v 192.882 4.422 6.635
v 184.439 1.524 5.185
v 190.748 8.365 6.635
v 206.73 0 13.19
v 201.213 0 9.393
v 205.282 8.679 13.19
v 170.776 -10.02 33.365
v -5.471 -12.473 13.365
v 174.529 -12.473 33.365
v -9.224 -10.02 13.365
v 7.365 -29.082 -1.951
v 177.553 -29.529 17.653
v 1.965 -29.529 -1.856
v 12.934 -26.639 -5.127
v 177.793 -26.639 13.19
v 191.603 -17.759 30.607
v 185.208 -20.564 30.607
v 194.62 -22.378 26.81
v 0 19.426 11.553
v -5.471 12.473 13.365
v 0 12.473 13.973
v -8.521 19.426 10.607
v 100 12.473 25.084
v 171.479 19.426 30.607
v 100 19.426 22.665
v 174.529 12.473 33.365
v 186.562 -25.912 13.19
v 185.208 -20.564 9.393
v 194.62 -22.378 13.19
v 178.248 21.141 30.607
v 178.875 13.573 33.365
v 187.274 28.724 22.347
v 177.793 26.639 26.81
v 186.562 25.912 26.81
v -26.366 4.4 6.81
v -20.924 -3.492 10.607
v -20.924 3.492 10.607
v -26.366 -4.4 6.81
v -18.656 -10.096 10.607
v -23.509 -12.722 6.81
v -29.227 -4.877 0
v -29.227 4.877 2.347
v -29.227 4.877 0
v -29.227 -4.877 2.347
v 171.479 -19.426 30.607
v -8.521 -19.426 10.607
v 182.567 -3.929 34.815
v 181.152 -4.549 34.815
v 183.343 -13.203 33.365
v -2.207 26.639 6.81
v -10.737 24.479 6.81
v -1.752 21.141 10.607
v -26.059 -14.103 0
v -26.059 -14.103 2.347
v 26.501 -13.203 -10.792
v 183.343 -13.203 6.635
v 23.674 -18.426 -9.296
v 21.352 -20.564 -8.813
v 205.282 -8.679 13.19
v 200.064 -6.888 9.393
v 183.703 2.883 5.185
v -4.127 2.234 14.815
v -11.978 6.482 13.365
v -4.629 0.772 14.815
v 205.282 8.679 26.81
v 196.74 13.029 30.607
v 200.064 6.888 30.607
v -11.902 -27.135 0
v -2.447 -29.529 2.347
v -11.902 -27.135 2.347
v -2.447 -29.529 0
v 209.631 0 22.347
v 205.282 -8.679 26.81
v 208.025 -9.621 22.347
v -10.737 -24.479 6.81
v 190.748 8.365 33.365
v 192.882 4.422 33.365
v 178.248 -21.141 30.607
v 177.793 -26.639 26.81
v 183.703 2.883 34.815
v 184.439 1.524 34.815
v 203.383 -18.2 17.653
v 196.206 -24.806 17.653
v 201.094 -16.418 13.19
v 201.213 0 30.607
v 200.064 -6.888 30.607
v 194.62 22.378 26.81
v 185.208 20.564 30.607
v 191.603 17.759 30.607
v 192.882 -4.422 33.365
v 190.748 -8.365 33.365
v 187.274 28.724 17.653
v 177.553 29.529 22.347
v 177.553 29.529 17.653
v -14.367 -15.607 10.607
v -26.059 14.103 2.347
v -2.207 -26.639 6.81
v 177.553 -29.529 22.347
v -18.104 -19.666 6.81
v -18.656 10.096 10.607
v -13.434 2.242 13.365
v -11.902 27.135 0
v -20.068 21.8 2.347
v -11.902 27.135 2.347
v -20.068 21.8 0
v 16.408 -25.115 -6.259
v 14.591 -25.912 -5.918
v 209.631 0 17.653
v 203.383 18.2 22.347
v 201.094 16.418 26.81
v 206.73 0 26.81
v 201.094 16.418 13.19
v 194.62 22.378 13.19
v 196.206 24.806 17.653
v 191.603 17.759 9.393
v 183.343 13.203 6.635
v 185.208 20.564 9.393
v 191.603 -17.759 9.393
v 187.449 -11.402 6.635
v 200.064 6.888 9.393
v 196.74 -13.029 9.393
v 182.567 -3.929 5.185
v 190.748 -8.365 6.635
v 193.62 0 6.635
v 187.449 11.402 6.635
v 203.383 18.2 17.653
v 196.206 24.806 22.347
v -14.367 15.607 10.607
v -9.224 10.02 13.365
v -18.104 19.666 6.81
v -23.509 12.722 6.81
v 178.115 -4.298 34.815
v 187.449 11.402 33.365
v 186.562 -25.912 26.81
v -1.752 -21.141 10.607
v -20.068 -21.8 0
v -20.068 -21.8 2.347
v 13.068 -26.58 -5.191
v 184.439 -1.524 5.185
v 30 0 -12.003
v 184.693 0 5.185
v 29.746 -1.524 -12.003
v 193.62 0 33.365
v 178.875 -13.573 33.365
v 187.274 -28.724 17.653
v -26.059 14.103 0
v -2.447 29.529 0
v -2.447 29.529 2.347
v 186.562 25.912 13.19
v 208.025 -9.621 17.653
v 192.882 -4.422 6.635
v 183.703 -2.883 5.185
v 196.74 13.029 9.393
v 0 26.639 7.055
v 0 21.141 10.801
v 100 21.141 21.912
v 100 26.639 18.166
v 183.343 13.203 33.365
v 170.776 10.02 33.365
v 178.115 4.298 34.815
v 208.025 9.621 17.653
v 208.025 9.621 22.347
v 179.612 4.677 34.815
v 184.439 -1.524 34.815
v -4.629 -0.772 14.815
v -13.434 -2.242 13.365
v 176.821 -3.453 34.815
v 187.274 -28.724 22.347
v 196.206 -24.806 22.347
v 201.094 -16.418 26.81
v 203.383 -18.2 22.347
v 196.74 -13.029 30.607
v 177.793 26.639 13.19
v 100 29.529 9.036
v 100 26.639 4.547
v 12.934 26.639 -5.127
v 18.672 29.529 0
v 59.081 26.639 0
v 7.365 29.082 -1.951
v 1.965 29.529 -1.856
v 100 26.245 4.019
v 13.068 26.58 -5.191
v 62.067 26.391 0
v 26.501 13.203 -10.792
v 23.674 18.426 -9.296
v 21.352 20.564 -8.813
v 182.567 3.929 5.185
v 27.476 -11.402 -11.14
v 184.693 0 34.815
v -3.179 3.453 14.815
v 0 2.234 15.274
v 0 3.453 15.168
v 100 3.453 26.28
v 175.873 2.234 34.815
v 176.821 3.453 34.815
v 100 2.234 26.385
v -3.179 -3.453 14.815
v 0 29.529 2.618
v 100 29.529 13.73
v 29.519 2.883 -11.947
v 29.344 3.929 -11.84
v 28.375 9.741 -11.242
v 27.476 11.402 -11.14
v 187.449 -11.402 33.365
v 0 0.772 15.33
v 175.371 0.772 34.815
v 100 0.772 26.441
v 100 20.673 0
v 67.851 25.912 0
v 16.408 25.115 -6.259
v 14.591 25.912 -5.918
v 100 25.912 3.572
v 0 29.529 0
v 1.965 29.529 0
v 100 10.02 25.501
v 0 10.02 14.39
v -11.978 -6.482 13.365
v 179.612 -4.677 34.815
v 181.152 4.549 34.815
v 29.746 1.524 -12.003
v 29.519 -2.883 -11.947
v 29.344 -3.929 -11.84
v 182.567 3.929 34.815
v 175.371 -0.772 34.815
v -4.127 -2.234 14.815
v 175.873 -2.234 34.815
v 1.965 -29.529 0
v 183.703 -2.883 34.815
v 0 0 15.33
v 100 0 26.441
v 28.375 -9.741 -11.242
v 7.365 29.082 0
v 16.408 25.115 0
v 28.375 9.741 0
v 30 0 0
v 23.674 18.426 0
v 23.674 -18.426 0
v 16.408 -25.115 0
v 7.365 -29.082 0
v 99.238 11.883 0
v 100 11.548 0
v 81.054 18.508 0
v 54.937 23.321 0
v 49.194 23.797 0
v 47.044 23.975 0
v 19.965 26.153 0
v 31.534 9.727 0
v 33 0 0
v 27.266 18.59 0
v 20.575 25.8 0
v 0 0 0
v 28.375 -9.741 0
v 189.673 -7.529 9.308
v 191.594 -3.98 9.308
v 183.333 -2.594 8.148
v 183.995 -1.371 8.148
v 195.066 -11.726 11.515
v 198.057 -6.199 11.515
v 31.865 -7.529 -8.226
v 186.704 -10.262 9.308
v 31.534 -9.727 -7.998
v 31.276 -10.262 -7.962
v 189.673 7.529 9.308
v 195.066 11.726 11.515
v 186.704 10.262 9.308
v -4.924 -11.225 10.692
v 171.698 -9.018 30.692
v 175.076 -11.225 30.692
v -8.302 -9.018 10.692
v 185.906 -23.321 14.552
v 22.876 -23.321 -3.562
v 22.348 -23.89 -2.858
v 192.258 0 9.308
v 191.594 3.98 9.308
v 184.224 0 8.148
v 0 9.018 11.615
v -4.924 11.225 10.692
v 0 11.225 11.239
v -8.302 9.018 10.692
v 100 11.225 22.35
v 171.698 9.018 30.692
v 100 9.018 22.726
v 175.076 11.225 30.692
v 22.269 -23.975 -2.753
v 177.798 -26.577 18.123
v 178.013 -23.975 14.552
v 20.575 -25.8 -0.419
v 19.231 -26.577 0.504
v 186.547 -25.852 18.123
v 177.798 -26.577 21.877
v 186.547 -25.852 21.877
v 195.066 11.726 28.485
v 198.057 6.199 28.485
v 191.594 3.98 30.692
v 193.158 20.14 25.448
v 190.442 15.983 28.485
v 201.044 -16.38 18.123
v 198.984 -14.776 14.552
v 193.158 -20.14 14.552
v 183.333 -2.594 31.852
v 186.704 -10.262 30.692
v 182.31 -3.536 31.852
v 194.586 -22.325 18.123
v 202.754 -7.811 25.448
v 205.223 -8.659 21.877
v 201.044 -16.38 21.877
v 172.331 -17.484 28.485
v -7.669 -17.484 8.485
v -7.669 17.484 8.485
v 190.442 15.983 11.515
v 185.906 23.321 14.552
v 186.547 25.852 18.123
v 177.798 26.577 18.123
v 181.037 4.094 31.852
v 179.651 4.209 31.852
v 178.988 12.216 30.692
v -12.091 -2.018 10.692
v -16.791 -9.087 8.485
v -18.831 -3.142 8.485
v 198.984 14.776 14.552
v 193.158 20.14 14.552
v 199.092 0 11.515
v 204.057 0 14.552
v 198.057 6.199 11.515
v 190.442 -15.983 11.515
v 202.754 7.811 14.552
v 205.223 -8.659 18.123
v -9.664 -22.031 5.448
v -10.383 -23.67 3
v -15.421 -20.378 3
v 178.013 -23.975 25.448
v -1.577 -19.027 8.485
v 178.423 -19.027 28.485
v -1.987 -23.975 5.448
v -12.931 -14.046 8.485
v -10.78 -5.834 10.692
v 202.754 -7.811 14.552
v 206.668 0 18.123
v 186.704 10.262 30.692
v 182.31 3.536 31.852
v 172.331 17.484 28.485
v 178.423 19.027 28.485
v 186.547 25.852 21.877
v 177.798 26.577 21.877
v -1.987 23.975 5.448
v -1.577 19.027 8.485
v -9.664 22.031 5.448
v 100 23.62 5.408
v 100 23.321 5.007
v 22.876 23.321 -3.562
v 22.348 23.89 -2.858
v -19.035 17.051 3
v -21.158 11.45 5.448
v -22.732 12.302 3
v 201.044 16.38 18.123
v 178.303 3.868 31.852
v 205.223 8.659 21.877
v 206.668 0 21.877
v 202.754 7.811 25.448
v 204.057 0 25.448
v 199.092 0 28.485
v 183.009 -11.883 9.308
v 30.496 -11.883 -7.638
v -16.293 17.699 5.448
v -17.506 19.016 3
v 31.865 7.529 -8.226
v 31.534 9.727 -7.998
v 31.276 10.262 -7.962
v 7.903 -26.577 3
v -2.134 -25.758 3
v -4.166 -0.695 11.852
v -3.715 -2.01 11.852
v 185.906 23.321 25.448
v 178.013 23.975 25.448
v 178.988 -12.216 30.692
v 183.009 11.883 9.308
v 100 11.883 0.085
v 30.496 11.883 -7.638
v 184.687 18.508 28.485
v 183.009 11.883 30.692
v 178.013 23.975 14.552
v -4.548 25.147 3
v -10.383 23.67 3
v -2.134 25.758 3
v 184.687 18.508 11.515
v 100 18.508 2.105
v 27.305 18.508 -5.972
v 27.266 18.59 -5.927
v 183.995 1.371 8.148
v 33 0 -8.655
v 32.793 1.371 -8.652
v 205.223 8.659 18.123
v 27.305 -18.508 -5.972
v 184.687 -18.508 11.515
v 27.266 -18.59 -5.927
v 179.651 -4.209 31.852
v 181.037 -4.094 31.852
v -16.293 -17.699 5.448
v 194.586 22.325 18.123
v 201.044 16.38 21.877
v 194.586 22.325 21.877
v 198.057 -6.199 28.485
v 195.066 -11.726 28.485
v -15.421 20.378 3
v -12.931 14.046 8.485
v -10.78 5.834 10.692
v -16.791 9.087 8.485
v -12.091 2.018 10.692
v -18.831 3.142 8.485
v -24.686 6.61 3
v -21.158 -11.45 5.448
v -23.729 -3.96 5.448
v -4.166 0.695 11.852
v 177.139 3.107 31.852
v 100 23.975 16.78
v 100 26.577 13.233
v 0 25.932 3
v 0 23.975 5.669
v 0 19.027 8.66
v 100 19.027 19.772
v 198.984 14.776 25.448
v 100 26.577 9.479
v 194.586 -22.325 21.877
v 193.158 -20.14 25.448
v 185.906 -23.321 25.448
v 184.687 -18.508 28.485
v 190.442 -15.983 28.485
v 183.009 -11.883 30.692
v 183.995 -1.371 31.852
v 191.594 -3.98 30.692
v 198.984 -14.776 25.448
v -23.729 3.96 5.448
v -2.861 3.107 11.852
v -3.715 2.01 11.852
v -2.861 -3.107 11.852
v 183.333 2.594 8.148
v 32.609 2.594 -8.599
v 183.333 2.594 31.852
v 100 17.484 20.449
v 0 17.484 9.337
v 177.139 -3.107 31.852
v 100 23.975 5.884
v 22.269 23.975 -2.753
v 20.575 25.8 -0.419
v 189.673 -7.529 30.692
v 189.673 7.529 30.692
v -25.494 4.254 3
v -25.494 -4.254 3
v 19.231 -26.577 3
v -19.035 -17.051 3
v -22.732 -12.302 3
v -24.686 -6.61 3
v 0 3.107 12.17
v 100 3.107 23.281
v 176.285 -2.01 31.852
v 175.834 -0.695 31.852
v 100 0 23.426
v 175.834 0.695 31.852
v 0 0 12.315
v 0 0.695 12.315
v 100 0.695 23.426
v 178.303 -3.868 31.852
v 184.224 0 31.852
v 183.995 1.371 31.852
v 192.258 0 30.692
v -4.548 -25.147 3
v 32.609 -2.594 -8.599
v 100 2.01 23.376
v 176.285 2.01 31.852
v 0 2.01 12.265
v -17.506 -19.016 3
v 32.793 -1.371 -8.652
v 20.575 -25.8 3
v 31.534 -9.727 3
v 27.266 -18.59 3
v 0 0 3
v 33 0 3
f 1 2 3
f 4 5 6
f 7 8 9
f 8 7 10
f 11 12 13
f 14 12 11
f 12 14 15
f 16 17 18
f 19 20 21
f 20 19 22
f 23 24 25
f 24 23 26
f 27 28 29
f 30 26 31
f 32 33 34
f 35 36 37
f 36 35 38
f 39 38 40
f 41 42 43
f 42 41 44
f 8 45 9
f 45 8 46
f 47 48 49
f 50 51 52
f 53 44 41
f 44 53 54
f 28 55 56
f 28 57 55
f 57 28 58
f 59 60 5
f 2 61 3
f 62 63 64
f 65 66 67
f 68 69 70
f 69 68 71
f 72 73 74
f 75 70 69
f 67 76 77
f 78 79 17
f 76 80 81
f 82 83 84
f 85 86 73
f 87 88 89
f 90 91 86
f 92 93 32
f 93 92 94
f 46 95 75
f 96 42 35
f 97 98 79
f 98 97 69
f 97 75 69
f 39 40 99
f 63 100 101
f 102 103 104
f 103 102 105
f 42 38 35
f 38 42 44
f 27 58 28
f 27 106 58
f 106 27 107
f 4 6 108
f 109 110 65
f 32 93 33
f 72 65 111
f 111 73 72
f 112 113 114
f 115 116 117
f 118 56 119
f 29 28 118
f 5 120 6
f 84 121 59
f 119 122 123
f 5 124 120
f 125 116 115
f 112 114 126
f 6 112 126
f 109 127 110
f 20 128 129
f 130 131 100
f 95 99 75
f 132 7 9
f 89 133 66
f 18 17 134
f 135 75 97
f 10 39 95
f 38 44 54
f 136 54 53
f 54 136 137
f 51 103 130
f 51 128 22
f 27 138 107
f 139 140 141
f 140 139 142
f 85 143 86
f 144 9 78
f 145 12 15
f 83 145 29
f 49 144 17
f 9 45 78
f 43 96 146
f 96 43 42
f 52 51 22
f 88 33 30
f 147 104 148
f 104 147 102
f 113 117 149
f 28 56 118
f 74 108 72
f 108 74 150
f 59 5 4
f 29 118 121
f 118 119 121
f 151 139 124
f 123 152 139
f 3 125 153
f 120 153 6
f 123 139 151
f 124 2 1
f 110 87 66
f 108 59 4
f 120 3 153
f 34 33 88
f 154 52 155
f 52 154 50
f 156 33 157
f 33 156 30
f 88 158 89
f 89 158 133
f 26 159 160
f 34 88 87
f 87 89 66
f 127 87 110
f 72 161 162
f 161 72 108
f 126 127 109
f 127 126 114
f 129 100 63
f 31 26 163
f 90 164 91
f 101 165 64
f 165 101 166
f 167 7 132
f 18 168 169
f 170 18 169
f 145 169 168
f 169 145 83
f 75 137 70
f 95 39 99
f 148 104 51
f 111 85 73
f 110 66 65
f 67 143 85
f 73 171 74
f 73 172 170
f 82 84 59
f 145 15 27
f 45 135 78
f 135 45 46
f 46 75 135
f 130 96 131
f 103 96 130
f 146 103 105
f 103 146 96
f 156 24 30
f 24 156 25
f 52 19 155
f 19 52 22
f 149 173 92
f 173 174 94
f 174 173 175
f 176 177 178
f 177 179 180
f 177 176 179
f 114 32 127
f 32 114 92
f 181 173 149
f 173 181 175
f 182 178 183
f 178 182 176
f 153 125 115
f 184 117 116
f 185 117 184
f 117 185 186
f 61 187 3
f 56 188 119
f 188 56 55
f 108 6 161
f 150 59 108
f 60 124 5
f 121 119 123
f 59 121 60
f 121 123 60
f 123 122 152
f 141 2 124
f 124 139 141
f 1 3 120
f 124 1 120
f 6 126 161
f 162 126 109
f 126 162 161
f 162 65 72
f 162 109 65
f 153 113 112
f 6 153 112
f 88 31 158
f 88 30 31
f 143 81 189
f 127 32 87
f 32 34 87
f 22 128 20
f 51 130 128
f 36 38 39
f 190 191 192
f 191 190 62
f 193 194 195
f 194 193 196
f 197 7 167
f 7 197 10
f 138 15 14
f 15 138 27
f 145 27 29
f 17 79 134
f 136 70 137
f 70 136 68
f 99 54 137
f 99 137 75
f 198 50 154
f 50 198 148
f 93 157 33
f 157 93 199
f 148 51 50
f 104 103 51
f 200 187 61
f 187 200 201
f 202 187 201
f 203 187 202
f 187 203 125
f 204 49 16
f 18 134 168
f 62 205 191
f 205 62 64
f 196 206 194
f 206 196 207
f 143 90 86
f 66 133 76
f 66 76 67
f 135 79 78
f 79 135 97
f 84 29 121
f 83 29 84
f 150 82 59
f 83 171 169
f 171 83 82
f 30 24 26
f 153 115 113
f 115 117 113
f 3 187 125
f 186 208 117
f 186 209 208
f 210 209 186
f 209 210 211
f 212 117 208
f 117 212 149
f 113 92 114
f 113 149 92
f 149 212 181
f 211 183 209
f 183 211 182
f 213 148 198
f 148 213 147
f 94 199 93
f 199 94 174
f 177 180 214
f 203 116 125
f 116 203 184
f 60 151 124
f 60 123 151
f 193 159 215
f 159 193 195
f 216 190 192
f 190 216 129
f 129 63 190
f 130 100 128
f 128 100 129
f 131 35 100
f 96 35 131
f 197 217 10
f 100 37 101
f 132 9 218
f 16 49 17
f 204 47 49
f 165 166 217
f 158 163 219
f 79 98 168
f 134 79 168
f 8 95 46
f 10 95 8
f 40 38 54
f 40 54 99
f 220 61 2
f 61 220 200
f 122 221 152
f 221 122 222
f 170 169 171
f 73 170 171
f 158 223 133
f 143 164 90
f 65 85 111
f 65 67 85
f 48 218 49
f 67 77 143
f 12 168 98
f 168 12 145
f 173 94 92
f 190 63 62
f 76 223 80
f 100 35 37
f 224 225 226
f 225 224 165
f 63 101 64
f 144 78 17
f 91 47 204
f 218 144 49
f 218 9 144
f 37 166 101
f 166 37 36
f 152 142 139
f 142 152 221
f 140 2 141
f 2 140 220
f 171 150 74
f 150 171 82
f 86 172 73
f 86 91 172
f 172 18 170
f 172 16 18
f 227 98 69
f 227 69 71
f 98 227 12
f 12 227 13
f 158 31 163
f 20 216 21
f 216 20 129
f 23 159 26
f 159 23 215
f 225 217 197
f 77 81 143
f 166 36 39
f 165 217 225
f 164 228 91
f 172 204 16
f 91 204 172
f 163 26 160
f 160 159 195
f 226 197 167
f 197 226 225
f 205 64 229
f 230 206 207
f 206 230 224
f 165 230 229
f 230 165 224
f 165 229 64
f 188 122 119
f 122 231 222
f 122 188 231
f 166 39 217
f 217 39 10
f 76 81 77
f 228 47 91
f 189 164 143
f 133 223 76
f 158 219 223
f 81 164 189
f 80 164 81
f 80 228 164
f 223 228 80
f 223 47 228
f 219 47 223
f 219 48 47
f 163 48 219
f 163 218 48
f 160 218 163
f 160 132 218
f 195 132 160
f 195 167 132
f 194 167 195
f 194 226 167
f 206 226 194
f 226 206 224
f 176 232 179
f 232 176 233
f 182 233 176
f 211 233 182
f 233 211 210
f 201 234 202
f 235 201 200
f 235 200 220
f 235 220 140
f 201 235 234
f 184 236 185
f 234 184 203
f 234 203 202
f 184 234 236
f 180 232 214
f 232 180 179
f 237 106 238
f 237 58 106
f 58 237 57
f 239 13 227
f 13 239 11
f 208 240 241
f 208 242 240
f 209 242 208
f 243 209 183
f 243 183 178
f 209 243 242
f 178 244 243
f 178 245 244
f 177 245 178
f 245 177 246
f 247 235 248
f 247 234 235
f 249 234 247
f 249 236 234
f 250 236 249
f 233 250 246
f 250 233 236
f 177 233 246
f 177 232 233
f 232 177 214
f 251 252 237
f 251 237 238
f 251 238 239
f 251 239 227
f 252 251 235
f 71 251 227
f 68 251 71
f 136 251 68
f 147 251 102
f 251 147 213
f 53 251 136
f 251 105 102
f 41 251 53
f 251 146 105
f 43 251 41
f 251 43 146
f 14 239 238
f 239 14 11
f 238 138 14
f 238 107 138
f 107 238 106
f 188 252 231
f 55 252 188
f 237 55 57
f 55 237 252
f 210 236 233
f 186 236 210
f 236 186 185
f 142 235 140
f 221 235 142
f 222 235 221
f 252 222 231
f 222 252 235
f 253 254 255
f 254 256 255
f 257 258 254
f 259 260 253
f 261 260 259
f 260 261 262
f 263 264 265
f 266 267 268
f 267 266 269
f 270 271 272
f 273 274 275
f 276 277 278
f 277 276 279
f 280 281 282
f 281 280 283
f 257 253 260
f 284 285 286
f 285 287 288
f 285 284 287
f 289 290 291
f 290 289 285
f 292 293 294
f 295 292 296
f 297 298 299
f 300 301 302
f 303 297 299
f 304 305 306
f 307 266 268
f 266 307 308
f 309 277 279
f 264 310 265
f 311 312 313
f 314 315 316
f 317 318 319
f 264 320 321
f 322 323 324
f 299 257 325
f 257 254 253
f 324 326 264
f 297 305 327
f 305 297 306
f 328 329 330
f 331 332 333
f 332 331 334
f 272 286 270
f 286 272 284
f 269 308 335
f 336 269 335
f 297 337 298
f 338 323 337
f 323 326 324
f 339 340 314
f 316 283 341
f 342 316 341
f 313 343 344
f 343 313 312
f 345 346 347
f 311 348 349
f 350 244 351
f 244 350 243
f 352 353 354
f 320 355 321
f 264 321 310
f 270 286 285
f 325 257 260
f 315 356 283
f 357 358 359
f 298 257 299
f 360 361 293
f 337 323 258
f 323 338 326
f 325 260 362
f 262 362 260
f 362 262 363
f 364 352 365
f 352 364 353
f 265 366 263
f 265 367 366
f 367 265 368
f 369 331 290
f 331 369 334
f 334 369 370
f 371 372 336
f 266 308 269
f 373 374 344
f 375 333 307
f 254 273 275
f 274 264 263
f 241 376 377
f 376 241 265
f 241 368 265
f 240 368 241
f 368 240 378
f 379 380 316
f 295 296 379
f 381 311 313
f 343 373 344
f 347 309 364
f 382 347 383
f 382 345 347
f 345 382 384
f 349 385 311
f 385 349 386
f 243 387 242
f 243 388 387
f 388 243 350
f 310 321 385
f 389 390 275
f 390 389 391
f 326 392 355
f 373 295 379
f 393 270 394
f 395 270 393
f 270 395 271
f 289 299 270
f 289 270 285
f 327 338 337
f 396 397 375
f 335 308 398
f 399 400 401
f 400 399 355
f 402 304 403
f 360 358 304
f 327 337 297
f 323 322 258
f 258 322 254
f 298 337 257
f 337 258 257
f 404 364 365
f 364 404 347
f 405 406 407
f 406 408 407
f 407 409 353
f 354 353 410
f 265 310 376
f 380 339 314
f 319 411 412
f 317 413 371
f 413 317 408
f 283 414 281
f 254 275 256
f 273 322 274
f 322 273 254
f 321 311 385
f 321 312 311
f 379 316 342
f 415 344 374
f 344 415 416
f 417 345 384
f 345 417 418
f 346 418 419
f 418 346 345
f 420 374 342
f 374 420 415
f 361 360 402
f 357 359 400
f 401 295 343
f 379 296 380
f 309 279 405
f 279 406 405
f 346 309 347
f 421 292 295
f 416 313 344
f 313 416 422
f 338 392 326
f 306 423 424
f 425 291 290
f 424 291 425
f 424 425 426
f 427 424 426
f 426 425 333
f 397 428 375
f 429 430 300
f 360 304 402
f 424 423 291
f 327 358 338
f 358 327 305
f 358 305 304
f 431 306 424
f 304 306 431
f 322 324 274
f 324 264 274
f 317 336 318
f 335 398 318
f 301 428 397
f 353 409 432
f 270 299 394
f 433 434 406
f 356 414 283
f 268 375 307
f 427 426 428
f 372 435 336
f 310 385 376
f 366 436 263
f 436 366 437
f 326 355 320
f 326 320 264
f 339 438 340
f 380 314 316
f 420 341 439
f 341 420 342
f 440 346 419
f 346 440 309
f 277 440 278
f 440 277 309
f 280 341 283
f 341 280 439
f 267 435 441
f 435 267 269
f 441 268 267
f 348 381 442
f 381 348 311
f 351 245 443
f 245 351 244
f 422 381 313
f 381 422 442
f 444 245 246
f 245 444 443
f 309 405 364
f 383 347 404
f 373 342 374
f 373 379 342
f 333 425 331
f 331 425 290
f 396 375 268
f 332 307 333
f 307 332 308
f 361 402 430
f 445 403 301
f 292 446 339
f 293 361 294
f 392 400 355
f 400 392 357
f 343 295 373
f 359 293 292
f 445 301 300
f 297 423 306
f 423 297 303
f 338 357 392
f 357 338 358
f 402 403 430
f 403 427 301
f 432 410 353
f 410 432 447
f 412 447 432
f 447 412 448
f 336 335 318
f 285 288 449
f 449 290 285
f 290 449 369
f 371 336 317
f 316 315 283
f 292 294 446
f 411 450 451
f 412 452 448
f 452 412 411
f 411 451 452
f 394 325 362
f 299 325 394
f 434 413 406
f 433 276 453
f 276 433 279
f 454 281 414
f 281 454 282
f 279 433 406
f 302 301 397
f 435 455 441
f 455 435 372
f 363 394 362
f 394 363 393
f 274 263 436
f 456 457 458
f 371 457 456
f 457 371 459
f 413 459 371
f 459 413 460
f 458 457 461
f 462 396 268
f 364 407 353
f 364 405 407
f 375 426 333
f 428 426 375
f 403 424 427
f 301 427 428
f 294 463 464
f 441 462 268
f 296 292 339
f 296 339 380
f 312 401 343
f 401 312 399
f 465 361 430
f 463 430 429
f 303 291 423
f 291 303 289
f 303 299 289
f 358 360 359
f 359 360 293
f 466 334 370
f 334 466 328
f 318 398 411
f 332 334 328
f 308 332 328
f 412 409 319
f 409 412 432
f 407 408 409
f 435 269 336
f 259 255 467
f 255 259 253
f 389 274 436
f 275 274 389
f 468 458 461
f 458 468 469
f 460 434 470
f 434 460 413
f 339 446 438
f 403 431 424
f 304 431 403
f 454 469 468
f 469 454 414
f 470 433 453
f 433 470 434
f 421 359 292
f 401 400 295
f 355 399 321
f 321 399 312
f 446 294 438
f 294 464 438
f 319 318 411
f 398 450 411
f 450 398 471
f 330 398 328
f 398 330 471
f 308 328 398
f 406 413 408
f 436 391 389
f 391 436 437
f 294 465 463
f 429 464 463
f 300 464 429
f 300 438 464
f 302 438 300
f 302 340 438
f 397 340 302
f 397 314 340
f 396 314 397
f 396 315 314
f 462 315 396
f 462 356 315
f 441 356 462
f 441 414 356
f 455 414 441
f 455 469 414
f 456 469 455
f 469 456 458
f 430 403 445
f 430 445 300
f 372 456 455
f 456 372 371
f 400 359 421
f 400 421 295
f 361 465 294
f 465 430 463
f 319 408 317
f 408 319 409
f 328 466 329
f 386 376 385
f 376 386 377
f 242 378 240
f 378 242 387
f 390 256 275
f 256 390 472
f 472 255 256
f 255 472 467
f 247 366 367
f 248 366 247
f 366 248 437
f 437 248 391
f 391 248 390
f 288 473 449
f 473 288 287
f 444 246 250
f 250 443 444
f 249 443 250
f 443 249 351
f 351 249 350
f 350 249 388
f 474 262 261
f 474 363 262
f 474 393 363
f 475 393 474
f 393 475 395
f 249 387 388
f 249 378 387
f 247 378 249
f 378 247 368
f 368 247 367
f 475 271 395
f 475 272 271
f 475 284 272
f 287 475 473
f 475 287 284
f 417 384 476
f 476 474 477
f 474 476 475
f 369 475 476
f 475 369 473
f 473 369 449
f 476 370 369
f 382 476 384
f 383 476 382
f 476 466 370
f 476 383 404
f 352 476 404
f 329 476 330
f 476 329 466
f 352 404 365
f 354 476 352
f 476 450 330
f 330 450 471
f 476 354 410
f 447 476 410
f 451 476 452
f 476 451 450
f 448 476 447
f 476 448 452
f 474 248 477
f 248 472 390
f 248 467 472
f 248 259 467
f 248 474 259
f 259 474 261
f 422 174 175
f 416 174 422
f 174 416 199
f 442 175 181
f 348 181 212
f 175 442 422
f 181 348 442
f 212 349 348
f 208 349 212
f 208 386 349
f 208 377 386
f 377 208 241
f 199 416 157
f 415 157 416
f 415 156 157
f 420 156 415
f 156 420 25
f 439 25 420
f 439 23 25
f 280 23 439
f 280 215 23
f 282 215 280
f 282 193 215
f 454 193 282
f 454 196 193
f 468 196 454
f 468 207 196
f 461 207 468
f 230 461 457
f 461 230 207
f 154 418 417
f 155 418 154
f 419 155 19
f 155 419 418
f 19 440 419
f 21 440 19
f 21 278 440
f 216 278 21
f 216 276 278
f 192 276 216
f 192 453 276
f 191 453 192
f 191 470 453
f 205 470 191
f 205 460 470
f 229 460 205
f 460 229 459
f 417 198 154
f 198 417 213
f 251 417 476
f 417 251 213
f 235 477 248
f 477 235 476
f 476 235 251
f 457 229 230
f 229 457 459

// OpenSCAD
$fa=10;
$fs=10;

armLength = 180; // shoulder-to-elbow
shoulderR = 30; // size of shoulder circle
elbowR = 25;
elbowCenter=[armLength, 0, 20];

jointScale = [1, 1, 0.5];

module shrinkableEllipse(r, scale, shrink) {
    shrinkScale=[r*scale[0]-shrink,r*scale[1]-shrink,r*scale[2]-shrink]/r;
    scale(shrinkScale) sphere(r=r);
}

module armOutside(shrink=0) {
    hull() {
        shrinkableEllipse(shoulderR,jointScale,shrink);
        translate(elbowCenter)
            shrinkableEllipse(shoulderR,jointScale,shrink);
    }
}

// 50's style robot
//rotate([0, 90, 0])
//    cylinder(r=0.7*elbowR, h=armLength);

//armOutside();

module armDriveable(shrink=0) {
    difference() {
        armOutside(shrink);
        scale([1, 1, -1])
        translate([0, 0, -shrink])
            cylinder(r=shoulderR+shrink,h=100);
    }
}

module armHollow(outsideShrink, insideShrink) {
    difference() {
        armDriveable(outsideShrink);
        armDriveable(insideShrink);
    }
}

module setOfRibs(ribSpace=12) {
    for (x=[-shoulderR:ribSpace:armLength+elbowR])
        translate([x,0,0]) cube([wall,200,200], center=true);
}

wall=3;
ribs=0.8;
difference() {
    union() {
        armHollow(0, wall);
        intersection() {
            armHollow(wall,ribs);
            setOfRibs();
        }
    }
    cube([100,100,100]);
}
